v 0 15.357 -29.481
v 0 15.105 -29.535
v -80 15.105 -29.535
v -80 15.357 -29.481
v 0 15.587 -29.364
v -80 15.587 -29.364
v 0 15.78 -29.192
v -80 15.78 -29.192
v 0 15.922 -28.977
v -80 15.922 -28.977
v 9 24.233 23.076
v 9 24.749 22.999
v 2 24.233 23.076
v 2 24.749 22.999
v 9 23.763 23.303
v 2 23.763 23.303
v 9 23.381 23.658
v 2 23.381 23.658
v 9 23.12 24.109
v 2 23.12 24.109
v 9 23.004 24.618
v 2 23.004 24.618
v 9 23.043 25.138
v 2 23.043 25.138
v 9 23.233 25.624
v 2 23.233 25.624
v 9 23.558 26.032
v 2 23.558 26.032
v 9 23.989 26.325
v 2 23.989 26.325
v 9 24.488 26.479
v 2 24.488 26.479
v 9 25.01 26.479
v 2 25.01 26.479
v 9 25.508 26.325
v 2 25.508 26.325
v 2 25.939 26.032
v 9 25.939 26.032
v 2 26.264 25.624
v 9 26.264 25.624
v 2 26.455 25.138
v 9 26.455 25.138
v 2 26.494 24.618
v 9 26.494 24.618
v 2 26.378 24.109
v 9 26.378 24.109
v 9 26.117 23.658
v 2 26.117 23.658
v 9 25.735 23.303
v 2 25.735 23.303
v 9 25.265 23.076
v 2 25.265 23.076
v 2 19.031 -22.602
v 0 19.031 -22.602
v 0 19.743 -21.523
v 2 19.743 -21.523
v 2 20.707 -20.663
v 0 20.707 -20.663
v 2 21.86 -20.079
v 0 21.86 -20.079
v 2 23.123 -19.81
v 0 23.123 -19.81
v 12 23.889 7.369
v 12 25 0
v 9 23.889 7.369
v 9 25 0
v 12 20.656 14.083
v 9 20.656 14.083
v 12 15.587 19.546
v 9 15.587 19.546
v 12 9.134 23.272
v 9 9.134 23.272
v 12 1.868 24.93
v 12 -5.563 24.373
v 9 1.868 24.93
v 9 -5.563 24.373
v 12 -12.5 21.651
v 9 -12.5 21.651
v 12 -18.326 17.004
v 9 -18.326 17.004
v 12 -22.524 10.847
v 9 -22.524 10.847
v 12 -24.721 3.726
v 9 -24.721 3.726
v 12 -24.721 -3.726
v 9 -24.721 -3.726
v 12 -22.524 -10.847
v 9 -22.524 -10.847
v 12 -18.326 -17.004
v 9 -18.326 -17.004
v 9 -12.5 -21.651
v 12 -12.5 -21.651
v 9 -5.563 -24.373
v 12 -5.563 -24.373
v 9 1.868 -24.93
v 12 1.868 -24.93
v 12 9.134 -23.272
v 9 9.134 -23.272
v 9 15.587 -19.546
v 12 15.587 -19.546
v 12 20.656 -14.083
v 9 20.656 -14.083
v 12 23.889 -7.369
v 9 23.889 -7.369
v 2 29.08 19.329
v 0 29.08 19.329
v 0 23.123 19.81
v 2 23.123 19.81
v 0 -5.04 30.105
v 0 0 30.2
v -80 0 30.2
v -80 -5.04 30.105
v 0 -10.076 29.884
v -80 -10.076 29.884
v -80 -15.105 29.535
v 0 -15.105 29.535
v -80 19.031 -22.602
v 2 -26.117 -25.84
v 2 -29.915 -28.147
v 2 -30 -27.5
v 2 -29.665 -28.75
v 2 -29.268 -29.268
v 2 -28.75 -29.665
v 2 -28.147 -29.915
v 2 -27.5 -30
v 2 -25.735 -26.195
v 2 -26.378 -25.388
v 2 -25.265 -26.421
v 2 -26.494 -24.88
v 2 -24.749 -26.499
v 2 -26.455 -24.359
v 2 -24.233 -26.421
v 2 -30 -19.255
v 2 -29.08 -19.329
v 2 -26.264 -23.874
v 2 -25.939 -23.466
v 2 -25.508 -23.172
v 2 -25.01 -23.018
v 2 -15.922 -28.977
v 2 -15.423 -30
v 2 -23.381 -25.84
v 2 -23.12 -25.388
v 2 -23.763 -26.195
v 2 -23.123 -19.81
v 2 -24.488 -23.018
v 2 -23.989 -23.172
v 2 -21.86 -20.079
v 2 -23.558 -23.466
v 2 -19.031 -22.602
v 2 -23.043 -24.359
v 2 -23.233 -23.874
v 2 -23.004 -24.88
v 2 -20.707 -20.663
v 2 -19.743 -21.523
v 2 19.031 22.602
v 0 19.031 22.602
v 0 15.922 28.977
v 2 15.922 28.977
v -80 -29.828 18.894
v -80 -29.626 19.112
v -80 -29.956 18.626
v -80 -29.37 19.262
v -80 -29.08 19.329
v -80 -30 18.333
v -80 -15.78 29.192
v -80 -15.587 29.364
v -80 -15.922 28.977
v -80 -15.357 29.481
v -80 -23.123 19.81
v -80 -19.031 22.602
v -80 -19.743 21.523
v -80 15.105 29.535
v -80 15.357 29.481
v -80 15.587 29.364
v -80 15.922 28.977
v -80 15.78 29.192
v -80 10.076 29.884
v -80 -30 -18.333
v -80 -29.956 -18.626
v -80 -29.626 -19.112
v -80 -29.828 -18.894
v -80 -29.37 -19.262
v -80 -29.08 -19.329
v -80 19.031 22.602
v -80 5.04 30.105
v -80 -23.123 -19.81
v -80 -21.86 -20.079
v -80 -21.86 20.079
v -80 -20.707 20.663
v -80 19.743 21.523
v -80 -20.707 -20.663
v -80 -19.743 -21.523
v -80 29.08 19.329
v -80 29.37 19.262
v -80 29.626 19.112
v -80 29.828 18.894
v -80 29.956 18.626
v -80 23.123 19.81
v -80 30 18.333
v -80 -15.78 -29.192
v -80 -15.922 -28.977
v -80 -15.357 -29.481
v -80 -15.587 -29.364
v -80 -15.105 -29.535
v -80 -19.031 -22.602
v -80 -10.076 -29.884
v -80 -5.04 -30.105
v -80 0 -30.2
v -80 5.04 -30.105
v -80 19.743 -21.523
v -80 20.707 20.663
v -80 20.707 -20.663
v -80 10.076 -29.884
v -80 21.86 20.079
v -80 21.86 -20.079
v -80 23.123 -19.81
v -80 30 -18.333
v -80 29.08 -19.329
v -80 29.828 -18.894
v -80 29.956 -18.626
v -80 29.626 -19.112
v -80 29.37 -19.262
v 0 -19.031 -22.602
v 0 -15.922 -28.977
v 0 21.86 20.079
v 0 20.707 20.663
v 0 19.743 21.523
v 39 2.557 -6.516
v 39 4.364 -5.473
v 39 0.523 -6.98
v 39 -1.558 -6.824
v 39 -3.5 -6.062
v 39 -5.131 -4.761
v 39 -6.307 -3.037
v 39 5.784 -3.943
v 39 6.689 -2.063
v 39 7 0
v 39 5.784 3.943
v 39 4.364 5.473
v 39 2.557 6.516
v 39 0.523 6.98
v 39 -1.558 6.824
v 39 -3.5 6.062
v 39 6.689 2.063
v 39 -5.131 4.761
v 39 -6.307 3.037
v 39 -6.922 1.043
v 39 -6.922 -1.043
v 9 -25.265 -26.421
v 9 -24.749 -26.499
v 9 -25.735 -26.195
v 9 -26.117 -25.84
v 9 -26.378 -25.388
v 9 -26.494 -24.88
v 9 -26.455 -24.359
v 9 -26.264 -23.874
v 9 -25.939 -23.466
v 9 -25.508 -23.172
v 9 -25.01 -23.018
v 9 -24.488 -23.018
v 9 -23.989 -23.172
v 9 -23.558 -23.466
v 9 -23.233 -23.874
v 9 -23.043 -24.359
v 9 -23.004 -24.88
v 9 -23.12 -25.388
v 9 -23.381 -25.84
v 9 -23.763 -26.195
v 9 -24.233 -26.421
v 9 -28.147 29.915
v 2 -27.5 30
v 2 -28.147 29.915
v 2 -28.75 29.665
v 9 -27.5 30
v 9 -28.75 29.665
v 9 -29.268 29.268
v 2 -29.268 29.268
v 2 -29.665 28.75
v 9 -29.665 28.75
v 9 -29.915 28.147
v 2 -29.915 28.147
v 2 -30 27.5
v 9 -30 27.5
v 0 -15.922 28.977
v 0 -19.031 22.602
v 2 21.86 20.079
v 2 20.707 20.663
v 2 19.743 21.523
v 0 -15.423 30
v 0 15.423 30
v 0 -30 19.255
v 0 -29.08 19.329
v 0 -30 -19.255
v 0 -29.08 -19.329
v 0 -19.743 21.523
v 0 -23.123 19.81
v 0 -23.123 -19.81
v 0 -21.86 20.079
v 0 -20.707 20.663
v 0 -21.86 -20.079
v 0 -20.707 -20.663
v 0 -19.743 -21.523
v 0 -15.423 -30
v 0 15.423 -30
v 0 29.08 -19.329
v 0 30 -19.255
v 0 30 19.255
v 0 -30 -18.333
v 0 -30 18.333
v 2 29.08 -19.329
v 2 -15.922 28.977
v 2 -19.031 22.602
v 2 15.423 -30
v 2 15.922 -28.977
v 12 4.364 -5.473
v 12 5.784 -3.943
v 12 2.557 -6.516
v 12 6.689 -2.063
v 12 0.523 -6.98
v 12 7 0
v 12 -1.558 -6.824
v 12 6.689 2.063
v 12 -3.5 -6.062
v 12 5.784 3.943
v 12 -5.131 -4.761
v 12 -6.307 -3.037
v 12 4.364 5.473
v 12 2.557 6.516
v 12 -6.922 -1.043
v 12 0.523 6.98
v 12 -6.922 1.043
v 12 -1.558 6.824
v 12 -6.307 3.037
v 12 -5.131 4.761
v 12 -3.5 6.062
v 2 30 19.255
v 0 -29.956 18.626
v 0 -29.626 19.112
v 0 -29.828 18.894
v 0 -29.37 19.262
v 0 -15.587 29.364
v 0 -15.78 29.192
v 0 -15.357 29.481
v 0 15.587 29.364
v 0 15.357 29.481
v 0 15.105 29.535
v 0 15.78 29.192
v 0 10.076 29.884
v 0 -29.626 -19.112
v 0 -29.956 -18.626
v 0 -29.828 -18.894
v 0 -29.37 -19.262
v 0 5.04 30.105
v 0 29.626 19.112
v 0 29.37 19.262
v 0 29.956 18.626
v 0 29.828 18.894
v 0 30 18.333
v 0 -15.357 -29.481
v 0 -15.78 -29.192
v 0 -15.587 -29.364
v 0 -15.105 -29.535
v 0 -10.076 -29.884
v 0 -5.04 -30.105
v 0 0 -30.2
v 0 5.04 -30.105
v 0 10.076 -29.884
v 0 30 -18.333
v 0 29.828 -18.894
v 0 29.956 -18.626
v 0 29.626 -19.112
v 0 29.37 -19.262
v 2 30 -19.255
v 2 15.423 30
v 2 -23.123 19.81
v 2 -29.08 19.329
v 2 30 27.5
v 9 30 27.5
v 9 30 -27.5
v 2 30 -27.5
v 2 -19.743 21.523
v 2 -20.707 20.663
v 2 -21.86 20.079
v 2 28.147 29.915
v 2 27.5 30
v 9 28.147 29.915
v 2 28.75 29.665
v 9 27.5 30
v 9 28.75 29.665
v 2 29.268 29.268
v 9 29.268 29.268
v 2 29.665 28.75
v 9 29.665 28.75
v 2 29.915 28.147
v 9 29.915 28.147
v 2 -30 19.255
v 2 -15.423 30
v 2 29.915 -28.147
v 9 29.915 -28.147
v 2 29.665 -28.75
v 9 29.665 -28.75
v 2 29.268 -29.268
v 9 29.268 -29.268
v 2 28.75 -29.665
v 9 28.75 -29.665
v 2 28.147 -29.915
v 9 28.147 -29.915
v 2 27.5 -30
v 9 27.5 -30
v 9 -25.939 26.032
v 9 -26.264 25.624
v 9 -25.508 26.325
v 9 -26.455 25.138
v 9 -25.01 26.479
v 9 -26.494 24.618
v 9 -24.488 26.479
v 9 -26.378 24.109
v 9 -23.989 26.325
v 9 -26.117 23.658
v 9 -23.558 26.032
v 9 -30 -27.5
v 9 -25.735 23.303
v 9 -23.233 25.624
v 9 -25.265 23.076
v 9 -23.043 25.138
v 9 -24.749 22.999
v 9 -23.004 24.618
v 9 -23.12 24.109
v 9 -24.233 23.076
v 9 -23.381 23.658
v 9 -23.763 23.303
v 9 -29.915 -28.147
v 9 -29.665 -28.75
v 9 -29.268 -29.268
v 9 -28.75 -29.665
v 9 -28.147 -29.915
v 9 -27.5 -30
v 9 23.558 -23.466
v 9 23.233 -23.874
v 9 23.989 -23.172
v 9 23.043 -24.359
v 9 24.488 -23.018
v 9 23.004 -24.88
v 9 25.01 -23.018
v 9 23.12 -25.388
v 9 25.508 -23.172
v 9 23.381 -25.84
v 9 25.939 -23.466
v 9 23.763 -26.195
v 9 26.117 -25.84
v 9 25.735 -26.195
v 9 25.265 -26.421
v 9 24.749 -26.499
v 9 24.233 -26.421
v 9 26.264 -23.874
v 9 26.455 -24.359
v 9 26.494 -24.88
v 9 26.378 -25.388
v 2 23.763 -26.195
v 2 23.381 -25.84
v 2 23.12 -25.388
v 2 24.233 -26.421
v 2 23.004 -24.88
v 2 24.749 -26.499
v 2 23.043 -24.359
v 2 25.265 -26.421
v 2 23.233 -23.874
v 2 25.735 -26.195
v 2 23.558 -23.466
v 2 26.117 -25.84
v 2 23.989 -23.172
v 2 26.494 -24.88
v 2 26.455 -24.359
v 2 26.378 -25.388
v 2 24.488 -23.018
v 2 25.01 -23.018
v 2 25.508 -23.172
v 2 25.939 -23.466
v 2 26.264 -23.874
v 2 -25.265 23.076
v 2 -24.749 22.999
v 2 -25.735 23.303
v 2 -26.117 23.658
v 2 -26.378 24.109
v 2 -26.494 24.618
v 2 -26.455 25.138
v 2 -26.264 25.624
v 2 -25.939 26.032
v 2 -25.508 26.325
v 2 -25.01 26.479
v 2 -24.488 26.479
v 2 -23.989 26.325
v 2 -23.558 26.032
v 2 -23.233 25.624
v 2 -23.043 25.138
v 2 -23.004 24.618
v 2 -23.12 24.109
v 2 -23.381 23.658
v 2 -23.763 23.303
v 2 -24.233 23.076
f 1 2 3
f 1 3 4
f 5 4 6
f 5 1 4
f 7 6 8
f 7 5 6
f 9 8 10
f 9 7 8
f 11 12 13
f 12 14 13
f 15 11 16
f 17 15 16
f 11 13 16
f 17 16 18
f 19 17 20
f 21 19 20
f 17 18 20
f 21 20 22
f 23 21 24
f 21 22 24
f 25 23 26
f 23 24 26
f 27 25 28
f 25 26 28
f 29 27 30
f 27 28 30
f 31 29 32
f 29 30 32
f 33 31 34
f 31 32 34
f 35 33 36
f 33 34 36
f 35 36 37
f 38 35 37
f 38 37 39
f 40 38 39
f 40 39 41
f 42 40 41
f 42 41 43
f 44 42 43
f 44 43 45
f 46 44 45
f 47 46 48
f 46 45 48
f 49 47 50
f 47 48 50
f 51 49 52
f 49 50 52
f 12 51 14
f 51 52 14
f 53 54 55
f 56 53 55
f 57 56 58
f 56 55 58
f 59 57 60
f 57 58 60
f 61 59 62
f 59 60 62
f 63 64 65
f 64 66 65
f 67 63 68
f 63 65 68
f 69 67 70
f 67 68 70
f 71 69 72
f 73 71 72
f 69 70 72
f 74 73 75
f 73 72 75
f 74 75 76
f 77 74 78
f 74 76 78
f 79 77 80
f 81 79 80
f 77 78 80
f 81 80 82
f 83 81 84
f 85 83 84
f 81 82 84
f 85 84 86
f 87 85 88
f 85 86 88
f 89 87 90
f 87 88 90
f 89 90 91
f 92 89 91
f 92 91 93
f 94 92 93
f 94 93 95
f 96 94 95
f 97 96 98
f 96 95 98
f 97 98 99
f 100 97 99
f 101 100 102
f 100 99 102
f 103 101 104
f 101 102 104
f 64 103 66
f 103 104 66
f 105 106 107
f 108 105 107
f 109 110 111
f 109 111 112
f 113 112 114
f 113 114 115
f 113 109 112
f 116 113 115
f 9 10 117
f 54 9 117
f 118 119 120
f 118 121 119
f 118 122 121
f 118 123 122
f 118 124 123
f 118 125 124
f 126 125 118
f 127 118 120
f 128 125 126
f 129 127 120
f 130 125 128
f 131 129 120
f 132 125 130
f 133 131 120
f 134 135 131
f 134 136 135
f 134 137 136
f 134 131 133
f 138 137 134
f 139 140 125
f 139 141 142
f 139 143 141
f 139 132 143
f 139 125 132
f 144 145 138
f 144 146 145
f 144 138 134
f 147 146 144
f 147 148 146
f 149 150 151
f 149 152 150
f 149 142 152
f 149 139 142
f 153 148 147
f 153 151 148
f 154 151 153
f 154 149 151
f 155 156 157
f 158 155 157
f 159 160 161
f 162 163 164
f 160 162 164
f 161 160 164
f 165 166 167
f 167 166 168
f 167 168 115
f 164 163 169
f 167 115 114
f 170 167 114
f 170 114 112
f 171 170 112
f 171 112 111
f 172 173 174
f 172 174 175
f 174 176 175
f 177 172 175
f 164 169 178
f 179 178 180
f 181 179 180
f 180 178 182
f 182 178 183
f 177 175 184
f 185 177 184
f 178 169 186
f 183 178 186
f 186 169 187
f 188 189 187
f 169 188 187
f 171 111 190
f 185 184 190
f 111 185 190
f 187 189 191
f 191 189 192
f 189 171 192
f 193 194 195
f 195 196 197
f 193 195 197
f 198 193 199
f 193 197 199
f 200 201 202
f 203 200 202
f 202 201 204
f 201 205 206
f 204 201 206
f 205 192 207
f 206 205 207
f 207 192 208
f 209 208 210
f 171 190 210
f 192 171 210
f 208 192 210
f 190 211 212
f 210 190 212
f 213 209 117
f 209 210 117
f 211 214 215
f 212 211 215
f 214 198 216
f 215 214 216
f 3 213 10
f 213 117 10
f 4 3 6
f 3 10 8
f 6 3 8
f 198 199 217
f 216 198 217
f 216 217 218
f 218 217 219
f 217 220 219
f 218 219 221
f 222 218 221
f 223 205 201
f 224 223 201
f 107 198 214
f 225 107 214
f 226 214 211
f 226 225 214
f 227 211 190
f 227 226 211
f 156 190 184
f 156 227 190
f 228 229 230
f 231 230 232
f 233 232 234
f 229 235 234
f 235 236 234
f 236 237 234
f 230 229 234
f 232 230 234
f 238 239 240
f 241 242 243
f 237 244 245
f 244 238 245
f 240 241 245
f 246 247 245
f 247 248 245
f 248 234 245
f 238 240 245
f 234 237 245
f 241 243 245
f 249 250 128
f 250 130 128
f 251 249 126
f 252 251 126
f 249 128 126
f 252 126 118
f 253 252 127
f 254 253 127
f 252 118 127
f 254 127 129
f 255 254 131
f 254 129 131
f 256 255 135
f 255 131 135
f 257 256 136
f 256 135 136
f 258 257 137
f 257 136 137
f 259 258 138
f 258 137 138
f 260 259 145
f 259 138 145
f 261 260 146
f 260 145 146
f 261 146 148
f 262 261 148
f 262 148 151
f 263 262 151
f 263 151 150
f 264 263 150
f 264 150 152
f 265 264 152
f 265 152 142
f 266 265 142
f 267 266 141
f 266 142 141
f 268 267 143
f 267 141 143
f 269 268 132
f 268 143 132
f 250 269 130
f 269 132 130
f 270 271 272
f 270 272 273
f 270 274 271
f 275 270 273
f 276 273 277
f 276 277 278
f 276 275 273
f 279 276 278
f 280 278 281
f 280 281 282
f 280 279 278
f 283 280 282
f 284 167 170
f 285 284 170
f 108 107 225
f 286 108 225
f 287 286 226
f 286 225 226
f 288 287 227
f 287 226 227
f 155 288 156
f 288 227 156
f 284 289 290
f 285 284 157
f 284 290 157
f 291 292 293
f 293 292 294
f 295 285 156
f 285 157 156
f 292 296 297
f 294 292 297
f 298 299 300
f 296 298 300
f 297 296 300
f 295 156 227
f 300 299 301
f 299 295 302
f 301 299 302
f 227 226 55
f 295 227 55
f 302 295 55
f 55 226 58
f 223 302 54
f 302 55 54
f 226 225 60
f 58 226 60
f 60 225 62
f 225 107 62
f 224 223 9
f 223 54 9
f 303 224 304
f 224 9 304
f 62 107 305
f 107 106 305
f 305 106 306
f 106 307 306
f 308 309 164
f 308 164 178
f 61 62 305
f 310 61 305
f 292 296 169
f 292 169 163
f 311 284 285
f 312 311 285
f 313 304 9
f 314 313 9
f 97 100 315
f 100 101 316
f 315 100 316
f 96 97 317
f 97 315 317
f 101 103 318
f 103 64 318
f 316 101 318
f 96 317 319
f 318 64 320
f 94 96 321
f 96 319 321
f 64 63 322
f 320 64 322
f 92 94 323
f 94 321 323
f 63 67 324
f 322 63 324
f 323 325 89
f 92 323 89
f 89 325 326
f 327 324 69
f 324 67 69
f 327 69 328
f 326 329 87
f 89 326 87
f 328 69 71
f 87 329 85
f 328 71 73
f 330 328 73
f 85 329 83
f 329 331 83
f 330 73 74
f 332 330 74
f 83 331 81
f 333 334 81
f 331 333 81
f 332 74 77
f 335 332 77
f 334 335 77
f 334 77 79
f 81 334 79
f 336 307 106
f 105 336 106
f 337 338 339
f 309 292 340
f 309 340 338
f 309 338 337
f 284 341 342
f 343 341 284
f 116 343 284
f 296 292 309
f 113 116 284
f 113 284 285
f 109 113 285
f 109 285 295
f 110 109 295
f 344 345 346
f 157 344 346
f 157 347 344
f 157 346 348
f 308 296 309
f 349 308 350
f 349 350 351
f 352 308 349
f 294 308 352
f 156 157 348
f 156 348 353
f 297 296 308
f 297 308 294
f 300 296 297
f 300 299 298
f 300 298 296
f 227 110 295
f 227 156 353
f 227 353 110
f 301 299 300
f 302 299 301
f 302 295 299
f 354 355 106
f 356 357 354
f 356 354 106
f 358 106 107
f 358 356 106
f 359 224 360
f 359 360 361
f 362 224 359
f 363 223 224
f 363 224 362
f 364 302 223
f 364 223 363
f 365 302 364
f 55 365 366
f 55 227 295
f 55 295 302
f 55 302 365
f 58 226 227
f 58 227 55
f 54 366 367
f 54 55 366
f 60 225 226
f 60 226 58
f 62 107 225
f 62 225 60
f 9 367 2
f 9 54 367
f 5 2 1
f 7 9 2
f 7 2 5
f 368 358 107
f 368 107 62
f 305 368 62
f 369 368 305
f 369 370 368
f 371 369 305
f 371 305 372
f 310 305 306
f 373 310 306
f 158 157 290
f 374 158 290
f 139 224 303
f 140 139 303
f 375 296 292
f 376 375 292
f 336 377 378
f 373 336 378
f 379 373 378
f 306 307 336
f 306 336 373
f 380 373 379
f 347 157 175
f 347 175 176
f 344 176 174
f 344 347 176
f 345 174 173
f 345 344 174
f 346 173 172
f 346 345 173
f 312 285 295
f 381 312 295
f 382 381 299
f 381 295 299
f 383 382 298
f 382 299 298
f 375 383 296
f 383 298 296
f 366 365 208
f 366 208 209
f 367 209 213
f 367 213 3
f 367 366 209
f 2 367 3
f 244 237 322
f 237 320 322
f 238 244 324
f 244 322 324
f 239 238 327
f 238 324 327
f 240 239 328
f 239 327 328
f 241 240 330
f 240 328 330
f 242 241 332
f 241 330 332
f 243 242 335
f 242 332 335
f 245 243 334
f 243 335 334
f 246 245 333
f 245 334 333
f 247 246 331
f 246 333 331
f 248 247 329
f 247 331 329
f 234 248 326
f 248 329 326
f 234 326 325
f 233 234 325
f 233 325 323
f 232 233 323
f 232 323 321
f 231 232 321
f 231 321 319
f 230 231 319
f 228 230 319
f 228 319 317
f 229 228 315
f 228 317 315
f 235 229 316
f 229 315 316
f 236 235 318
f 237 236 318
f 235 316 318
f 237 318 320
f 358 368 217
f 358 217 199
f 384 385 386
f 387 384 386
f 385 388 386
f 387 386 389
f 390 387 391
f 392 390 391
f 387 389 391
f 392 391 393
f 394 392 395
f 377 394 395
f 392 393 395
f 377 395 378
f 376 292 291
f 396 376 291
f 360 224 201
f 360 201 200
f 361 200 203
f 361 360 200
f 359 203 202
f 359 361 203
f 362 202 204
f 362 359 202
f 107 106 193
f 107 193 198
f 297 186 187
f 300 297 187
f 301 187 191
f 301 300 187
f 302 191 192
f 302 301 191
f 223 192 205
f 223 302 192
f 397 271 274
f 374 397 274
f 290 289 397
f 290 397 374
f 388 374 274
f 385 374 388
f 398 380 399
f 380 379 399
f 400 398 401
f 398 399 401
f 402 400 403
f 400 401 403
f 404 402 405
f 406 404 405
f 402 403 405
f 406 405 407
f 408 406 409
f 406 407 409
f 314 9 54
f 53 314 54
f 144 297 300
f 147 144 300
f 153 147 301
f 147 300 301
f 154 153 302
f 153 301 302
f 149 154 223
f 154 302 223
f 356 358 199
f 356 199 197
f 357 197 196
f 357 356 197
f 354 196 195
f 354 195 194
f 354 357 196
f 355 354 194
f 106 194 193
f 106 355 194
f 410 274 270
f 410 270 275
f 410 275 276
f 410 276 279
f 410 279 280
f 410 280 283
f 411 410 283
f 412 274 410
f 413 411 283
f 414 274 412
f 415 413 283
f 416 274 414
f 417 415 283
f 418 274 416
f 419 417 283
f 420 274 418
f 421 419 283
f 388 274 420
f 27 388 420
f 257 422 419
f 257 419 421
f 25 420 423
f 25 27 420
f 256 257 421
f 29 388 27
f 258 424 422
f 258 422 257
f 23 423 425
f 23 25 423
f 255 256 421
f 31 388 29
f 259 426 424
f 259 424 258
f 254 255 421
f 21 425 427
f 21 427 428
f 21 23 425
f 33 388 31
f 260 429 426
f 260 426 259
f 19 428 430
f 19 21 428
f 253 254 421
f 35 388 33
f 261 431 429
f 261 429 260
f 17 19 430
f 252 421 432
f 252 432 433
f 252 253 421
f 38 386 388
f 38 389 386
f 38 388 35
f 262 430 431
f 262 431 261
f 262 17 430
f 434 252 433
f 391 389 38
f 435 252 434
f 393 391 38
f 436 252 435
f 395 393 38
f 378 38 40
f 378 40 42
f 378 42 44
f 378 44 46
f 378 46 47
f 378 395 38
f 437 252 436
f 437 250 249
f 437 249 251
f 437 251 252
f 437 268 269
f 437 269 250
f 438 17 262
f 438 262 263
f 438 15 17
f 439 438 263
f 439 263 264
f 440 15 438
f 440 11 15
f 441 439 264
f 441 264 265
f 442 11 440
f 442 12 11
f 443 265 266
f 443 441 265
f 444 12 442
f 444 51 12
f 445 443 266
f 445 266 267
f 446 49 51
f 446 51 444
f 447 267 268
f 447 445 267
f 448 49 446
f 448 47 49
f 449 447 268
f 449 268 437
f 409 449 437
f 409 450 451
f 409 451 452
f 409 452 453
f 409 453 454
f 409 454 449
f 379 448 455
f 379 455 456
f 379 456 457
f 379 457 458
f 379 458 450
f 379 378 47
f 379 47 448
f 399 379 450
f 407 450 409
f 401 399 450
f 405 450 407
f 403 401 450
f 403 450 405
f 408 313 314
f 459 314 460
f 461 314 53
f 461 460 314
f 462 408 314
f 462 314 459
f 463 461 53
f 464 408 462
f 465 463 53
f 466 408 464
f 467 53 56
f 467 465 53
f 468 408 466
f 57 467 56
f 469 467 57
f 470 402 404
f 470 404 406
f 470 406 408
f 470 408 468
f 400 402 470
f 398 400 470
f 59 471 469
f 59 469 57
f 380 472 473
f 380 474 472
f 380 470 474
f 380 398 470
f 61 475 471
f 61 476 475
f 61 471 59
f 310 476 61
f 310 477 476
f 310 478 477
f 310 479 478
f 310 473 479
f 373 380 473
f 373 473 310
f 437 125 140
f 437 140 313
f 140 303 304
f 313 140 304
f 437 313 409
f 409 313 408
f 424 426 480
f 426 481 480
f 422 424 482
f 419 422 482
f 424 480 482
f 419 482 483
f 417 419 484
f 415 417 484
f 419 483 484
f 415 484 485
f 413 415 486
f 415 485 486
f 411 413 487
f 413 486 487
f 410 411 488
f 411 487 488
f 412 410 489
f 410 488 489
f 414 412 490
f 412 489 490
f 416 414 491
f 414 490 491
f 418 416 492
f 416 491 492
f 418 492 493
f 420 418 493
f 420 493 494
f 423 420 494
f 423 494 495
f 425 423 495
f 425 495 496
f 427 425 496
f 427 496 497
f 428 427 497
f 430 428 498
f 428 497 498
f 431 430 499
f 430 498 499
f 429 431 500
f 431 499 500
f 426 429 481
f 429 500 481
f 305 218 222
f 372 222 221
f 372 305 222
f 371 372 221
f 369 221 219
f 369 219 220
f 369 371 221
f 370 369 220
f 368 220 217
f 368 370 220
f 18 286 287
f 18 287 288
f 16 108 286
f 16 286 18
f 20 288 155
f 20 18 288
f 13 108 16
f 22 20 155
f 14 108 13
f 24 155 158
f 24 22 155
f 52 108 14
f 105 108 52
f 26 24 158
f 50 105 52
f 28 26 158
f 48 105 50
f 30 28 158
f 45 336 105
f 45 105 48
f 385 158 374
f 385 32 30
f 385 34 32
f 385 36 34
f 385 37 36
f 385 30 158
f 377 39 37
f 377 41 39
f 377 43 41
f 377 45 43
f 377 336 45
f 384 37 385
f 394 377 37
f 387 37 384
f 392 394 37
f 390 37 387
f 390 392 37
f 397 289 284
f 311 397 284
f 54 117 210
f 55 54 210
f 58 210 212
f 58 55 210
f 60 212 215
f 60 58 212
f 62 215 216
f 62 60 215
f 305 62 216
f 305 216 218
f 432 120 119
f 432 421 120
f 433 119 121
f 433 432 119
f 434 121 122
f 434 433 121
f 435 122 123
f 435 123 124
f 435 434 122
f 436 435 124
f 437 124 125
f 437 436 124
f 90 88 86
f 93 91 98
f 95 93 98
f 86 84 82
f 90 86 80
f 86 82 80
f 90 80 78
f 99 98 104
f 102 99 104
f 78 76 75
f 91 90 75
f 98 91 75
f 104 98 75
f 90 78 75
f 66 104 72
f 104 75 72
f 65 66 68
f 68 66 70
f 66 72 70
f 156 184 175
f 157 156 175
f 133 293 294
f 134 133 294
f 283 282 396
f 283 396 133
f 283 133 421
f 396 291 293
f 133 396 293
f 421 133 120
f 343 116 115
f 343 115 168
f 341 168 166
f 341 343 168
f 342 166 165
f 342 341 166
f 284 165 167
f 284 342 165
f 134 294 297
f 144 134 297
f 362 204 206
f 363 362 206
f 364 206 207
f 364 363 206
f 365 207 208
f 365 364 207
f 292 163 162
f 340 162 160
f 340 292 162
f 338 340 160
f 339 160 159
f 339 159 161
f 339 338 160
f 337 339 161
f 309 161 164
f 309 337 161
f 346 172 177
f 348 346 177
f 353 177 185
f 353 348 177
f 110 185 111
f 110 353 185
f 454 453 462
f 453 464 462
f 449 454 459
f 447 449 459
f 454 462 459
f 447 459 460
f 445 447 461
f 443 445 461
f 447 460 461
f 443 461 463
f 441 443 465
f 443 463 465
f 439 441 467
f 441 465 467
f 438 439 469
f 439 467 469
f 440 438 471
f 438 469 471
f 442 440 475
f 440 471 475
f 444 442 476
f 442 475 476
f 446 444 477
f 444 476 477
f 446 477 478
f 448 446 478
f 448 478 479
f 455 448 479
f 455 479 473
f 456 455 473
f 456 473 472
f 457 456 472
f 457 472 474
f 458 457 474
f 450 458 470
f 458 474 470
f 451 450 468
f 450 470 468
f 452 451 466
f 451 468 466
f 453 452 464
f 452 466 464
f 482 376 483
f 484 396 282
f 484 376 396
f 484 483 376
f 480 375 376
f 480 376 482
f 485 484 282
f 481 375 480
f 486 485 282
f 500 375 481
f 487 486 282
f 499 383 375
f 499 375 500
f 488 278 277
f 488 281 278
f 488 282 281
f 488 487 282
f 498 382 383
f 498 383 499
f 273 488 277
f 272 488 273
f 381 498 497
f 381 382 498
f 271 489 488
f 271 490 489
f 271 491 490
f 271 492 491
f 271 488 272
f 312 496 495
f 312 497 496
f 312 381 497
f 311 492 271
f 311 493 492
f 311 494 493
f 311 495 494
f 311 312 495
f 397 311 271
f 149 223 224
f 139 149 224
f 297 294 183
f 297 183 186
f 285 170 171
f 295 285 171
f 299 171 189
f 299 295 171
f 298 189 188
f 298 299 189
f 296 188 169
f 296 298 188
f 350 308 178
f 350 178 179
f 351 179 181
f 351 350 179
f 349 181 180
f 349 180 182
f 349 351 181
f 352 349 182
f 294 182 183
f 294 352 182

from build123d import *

# Parameters (mm, degrees)
BOSS_EXTRUDE3_DEPTH                 = 80
SKETCH9_W                           = 60
SKETCH9_H                           = 60
BOSS_EXTRUDE4_DEPTH                 = 9
CUT_EXTRUDE1_DEPTH                  = 2
SKETCH10_W                          = 1.75
SKETCH10_H                          = 7
F_3_5_3_5_DIAMETER_HOLE1_AT_2_COUNT = 2
F_3_5_3_5_DIAMETER_HOLE1_AT_2_PITCH = 49.497474683
F_3_5_3_5_DIAMETER_HOLE1_AT_3_COUNT = 2
F_3_5_3_5_DIAMETER_HOLE1_AT_3_PITCH = 49.497474683
F_3_5_3_5_DIAMETER_HOLE1_AT_4_COUNT = 2
F_3_5_3_5_DIAMETER_HOLE1_AT_4_PITCH = 70
FILLET2_R                           = 2.5


with BuildPart() as part:
    # Sketch7 → Boss-Extrude3 (new body)
    with BuildSketch(Plane(origin=(0, 0, 0), x_dir=(0, 0, -1), z_dir=(1, 0, 0))):
        with BuildLine():
            Line((-18.33259, -30), (18.33259, -30))
            ThreePointArc((18.33259, -30), (19.010683209, -29.734975918), (19.329354357, -29.0803792))
            Line((19.329354357, -29.0803792), (19.809736411, -23.123269525))
            ThreePointArc((19.809736411, -23.123269525), (20.663321526, -20.707161793), (22.60170242, -19.031195315))
            Line((22.60170242, -19.031195315), (28.976894141, -15.921806476))
            ThreePointArc((28.976894141, -15.921806476), (29.364202593, -15.587151765), (29.535181656, -15.104691639))
            ThreePointArc((29.535181656, -15.104691639), (30.010346531, -7.558626197), (30.200228925, 0))
            ThreePointArc((30.200228925, 0), (30.010346531, 7.558626197), (29.535181656, 15.104691639))
            ThreePointArc((29.535181656, 15.104691639), (29.364202593, 15.587151765), (28.976894141, 15.921806476))
            Line((28.976894141, 15.921806476), (22.60170242, 19.031195315))
            ThreePointArc((22.60170242, 19.031195315), (20.663321526, 20.707161793), (19.809736411, 23.123269525))
            Line((19.809736411, 23.123269525), (19.329354357, 29.0803792))
            ThreePointArc((19.329354357, 29.0803792), (19.010683209, 29.734975918), (18.33259, 30))
            Line((18.33259, 30), (-18.33259, 30))
            ThreePointArc((-18.33259, 30), (-19.010683209, 29.734975918), (-19.329354357, 29.0803792))
            Line((-19.329354357, 29.0803792), (-19.809736411, 23.123269525))
            ThreePointArc((-19.809736411, 23.123269525), (-20.663321526, 20.707161793), (-22.60170242, 19.031195315))
            Line((-22.60170242, 19.031195315), (-28.976894141, 15.921806476))
            ThreePointArc((-28.976894141, 15.921806476), (-29.364202593, 15.587151765), (-29.535181656, 15.104691639))
            ThreePointArc((-29.535181656, 15.104691639), (-30.010346531, 7.558626197), (-30.200228925, 0))
            ThreePointArc((-30.200228925, 0), (-30.010346531, -7.558626197), (-29.535181656, -15.104691639))
            ThreePointArc((-29.535181656, -15.104691639), (-29.364202593, -15.587151765), (-28.976894141, -15.921806476))
            Line((-28.976894141, -15.921806476), (-22.60170242, -19.031195315))
            ThreePointArc((-22.60170242, -19.031195315), (-20.663321526, -20.707161793), (-19.809736411, -23.123269525))
            Line((-19.809736411, -23.123269525), (-19.329354357, -29.0803792))
            ThreePointArc((-19.329354357, -29.0803792), (-19.010683209, -29.734975918), (-18.33259, -30))
        make_face()
    extrude(amount=-BOSS_EXTRUDE3_DEPTH)


with BuildPart() as body_2:
    # Sketch9 → Boss-Extrude4 (new body)
    with BuildSketch(Plane(origin=(0, 0, 0), x_dir=(0, 0, -1), z_dir=(1, 0, 0))):
        Rectangle(SKETCH9_W, SKETCH9_H)
    extrude(amount=BOSS_EXTRUDE4_DEPTH)

    # Sketch12 → Cut-Extrude1 (cut)
    with BuildSketch(Plane.ZY):
        with BuildLine():
            Line((-28.976894141, 15.921806476), (-22.60170242, 19.031195315))
            ThreePointArc((-22.60170242, 19.031195315), (-20.663321526, 20.707161793), (-19.809736411, 23.123269525))
            Line((-19.809736411, 23.123269525), (-19.329354357, 29.0803792))
            Line((-19.329354357, 29.0803792), (-19.255196023, 30))
            Line((-19.255196023, 30), (-30, 30))
            Line((-30, 30), (-30, 15.422804394))
            Line((-30, 15.422804394), (-28.976894141, 15.921806476))
        make_face()
        with BuildLine():
            Line((19.329354357, 29.0803792), (19.809736411, 23.123269525))
            ThreePointArc((19.809736411, 23.123269525), (20.663321526, 20.707161793), (22.60170242, 19.031195315))
            Line((22.60170242, 19.031195315), (28.976894141, 15.921806476))
            Line((28.976894141, 15.921806476), (30, 15.422804394))
            Line((30, 15.422804394), (30, 30))
            Line((30, 30), (19.255196023, 30))
            Line((19.255196023, 30), (19.329354357, 29.0803792))
        make_face()
        with BuildLine():
            Line((-22.60170242, -19.031195315), (-28.976894141, -15.921806476))
            Line((-28.976894141, -15.921806476), (-30, -15.422804394))
            Line((-30, -15.422804394), (-30, -30))
            Line((-30, -30), (-19.255196023, -30))
            Line((-19.255196023, -30), (-19.329354357, -29.0803792))
            Line((-19.329354357, -29.0803792), (-19.809736411, -23.123269525))
            ThreePointArc((-19.809736411, -23.123269525), (-20.663321526, -20.707161793), (-22.60170242, -19.031195315))
        make_face()
        with BuildLine():
            Line((19.809736411, -23.123269525), (19.329354357, -29.0803792))
            Line((19.329354357, -29.0803792), (19.255196023, -30))
            Line((19.255196023, -30), (30, -30))
            Line((30, -30), (30, -15.422804394))
            Line((30, -15.422804394), (28.976894141, -15.921806476))
            Line((28.976894141, -15.921806476), (22.60170242, -19.031195315))
            ThreePointArc((22.60170242, -19.031195315), (20.663321526, -20.707161793), (19.809736411, -23.123269525))
        make_face()
    extrude(amount=-CUT_EXTRUDE1_DEPTH, mode=Mode.SUBTRACT)

    # Sketch10 → Ø3.5 (3.5) Diameter Hole1 (revolve, cut)
    with BuildSketch(Plane(origin=(9, 24.748737342, 24.748737342), x_dir=(0, 0, -1), z_dir=(0, 1, 0))):
        with Locations((0.875, 3.5)):
            Rectangle(SKETCH10_W, SKETCH10_H)
    f_3_5_3_5_diameter_hole1 = revolve(axis=Axis((15.35, 24.748737342, 24.748737342), (-1, 0, 0)), mode=Mode.SUBTRACT)

    # Ø3.5 (3.5) Diameter Hole1 at 2: Ø3.5 (3.5) Diameter Hole1 ×2
    with Locations(*[(0, 0, -i * F_3_5_3_5_DIAMETER_HOLE1_AT_2_PITCH) for i in range(1, F_3_5_3_5_DIAMETER_HOLE1_AT_2_COUNT)]):
        add(f_3_5_3_5_diameter_hole1, mode=Mode.SUBTRACT)

    # Ø3.5 (3.5) Diameter Hole1 at 3: Ø3.5 (3.5) Diameter Hole1 ×2
    with Locations(*[(0, -i * F_3_5_3_5_DIAMETER_HOLE1_AT_3_PITCH, 0) for i in range(1, F_3_5_3_5_DIAMETER_HOLE1_AT_3_COUNT)]):
        add(f_3_5_3_5_diameter_hole1, mode=Mode.SUBTRACT)

    # Ø3.5 (3.5) Diameter Hole1 at 4: Ø3.5 (3.5) Diameter Hole1 ×2
    with Locations(*[Vector(0, -0.707106781, -0.707106781) * (i * F_3_5_3_5_DIAMETER_HOLE1_AT_4_PITCH) for i in range(1, F_3_5_3_5_DIAMETER_HOLE1_AT_4_COUNT)]):
        add(f_3_5_3_5_diameter_hole1, mode=Mode.SUBTRACT)

    # Fillet2
    fillet2_edges = [body_2.edges().sort_by_distance(p)[0] for p in [
        (5.5, 30, 30),
        (5.5, 30, -30),
        (5.5, -30, -30),
        (5.5, -30, 30),
    ]]
    fillet(fillet2_edges, radius=FILLET2_R)


with BuildPart() as body_3:
    # Sketch8 → Revolve5 (revolve)
    with BuildSketch(Plane.XY):
        Polygon((39, 0), (39, 7), (12, 7), (12, 25), (9, 25), (9, 0), align=None)
    revolve(axis=Axis((-4.899761849, 0, 0), (1, 0, 0)))


solid = Compound([part.part, body_2.part, body_3.part])
